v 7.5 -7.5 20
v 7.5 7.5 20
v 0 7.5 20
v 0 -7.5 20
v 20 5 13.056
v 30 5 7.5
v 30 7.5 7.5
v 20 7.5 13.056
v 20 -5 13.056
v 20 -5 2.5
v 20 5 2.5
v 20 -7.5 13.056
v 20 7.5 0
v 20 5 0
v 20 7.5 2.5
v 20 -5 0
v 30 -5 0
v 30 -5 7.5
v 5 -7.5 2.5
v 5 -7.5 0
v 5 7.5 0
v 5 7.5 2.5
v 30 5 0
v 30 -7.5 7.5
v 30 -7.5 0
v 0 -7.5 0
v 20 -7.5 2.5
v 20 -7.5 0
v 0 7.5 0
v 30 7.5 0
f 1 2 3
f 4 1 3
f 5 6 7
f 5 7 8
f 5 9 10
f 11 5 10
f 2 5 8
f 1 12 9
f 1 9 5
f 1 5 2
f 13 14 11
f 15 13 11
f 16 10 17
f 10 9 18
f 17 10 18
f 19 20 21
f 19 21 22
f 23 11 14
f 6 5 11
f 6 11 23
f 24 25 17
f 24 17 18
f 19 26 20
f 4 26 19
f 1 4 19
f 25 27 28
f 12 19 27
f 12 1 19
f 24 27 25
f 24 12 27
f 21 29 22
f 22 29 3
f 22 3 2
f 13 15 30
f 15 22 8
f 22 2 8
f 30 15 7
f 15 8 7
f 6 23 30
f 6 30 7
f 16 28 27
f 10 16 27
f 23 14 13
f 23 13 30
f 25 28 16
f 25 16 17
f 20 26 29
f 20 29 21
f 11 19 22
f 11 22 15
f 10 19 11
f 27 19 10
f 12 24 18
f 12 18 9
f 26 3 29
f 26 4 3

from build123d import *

# Parameters (mm, degrees)
F1_DEPTH = 7.5
F2_W     = 15
F2_H     = 2.5
F3_DEPTH = 15.001
F4_DEPTH = 5


with BuildPart() as f1:
    # F0 (on Front) → F1 (new body, symmetric)
    with BuildSketch(Plane.XZ):
        Polygon((0, 20), (0, 0), (20, 0), (20, 13.0555555556), (7.5, 20), align=None)
        Polygon((20, 13.0555555556), (20, 0), (30, 0), (30, 7.5), align=None)
    extrude(amount=F1_DEPTH, both=True)

    # F2 (on face) → F3 (cut, through all)
    with BuildSketch(Plane.XZ.offset(7.5)):
        with Locations((12.5, 1.25)):
            Rectangle(F2_W, F2_H)
    extrude(amount=-F3_DEPTH, mode=Mode.SUBTRACT)

    # F0 (on Front) → F4 (cut, symmetric)
    with BuildSketch(Plane.XZ):
        Polygon((20, 13.0555555556), (20, 0), (30, 0), (30, 7.5), align=None)
    extrude(amount=F4_DEPTH, both=True, mode=Mode.SUBTRACT)


solid = f1.part
